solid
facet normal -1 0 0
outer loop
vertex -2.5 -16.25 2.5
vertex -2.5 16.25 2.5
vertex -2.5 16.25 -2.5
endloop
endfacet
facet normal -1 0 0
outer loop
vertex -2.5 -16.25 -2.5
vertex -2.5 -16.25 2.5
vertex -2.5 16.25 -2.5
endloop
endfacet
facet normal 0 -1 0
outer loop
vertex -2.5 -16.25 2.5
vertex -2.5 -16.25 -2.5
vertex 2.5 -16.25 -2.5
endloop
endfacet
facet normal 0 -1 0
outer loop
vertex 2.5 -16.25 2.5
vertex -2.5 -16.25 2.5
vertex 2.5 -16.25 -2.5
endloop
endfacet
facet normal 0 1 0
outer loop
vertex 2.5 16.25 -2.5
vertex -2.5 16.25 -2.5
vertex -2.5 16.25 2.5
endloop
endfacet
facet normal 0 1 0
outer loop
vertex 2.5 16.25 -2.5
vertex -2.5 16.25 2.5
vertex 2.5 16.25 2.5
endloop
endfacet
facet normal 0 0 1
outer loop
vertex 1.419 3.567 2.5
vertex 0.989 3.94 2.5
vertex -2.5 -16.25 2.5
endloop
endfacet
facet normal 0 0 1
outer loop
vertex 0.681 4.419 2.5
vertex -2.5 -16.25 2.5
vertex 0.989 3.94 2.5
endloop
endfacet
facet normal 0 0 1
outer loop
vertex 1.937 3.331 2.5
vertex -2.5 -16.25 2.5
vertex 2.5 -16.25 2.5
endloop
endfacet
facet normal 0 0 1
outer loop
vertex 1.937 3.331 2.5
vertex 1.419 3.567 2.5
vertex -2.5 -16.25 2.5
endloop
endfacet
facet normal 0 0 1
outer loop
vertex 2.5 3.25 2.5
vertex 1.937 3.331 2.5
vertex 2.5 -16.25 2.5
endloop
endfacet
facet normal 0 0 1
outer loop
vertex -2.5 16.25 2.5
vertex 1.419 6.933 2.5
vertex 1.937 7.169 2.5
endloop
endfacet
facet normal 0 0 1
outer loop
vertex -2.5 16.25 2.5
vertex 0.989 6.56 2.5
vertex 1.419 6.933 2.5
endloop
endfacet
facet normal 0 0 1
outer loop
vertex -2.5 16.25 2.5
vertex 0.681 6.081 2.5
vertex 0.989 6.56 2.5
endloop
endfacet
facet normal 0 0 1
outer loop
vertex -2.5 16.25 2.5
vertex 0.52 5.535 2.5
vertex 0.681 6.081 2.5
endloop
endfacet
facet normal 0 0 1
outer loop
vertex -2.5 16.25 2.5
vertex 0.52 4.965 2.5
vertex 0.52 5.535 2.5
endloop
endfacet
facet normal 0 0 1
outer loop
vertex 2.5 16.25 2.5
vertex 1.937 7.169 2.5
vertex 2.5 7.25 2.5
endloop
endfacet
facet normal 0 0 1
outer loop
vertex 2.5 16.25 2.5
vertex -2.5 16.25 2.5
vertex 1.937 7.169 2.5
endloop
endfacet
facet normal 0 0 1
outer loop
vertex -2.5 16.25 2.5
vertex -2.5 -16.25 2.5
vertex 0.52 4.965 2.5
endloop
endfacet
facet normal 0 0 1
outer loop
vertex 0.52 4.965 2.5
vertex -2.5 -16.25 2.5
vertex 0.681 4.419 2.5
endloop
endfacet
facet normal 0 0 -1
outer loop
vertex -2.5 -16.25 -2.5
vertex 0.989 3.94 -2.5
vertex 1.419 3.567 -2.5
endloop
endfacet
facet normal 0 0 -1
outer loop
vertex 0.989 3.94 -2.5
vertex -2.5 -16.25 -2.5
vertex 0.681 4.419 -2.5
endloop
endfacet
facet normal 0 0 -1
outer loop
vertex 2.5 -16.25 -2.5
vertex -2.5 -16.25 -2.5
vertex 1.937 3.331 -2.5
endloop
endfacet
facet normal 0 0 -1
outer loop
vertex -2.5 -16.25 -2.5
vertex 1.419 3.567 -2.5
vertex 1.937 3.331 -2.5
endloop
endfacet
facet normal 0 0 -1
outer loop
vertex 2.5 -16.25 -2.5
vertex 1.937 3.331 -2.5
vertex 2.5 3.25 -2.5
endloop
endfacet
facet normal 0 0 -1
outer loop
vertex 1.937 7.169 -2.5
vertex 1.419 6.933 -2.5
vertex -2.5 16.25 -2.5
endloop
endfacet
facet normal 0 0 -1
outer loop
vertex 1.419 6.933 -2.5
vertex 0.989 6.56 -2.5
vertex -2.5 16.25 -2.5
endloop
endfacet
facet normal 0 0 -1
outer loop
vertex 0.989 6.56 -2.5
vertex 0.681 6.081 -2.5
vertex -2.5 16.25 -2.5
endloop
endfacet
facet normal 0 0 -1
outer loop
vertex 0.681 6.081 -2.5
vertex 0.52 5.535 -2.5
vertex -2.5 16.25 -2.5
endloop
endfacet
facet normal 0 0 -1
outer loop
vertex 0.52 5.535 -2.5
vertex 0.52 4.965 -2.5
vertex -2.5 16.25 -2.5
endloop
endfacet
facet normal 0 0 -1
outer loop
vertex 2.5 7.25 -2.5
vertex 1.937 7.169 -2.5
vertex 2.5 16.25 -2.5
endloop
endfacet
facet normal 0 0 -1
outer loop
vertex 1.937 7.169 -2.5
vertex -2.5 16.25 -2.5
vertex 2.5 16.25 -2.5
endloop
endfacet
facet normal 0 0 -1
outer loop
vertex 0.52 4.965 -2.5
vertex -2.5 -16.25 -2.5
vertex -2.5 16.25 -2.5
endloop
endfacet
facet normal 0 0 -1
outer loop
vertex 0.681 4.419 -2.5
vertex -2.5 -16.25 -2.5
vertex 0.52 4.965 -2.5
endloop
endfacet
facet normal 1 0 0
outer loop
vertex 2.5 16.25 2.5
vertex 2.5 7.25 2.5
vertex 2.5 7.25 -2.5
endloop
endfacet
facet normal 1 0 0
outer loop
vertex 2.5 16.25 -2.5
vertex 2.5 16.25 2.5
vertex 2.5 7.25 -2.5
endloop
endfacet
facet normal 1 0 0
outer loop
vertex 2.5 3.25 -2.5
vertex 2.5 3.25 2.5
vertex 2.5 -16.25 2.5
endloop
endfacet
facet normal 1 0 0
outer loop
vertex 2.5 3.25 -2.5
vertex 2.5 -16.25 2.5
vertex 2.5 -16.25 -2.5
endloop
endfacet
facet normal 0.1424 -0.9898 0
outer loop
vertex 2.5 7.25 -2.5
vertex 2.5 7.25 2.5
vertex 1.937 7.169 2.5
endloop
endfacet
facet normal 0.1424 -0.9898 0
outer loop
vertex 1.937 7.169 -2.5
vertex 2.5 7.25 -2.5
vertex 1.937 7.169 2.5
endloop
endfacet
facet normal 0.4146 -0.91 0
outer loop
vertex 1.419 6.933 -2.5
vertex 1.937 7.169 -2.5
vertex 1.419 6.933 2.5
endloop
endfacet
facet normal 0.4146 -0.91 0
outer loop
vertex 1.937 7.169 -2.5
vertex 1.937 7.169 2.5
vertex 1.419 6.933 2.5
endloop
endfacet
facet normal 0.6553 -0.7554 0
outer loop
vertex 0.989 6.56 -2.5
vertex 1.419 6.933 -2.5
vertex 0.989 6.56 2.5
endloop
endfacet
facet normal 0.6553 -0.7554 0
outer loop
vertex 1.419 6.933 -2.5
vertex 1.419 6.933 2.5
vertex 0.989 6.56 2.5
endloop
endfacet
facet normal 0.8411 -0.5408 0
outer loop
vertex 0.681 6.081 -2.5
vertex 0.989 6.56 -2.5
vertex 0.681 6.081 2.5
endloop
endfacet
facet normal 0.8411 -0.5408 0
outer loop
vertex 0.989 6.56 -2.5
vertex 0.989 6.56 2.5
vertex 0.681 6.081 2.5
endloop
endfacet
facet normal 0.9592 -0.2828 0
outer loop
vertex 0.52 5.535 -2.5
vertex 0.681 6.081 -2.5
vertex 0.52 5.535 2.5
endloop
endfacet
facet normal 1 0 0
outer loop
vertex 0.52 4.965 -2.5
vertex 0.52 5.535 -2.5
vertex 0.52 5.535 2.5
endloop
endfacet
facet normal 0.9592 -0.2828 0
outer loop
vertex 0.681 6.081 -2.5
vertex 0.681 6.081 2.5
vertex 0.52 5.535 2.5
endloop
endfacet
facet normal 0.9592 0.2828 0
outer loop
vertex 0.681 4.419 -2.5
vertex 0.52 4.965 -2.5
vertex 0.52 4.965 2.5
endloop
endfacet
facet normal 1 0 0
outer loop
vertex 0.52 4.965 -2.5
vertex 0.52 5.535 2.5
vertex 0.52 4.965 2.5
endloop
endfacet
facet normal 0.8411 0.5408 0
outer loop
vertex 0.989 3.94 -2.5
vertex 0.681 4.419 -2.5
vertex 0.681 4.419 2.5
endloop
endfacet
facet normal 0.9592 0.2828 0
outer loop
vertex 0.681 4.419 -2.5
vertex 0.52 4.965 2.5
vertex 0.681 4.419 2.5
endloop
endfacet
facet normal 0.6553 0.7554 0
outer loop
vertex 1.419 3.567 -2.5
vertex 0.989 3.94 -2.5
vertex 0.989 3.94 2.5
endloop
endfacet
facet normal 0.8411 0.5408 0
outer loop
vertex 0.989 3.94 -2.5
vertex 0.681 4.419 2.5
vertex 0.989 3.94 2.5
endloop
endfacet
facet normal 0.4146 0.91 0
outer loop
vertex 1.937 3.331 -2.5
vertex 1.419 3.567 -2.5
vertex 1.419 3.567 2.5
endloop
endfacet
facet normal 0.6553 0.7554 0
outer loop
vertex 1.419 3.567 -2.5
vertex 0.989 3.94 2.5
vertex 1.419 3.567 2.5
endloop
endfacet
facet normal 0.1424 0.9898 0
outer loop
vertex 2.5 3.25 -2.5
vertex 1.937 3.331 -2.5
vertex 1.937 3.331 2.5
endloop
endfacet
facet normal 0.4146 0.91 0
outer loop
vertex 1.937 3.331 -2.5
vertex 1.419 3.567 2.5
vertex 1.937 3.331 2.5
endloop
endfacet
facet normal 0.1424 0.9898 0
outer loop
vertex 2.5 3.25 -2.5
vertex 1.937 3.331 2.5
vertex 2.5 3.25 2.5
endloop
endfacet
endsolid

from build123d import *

# Parameters (mm, degrees)
CROQUIS1_W              = 5
CROQUIS1_H              = 5
SALIENTE_EXTRUIR1_DEPTH = 16.25
CROQUIS2_R              = 2
CORTAR_EXTRUIR1_DEPTH   = 18.184658856


with BuildPart() as part:
    # Croquis1 → Saliente-Extruir1 (new, symmetric)
    with BuildSketch(Plane(origin=(0, 0, 0), x_dir=(1, 0, 0), z_dir=(0, 1, 0))):
        Rectangle(CROQUIS1_W, CROQUIS1_H)
    extrude(amount=SALIENTE_EXTRUIR1_DEPTH, both=True)

    # Croquis2 → Cortar-Extruir1 (cut, through all)
    with BuildSketch(Plane.XY.offset(2.5)):
        with Locations((2.5, 5.25)):
            Circle(CROQUIS2_R)
    extrude(amount=-CORTAR_EXTRUIR1_DEPTH, mode=Mode.SUBTRACT)


solid = part.part
